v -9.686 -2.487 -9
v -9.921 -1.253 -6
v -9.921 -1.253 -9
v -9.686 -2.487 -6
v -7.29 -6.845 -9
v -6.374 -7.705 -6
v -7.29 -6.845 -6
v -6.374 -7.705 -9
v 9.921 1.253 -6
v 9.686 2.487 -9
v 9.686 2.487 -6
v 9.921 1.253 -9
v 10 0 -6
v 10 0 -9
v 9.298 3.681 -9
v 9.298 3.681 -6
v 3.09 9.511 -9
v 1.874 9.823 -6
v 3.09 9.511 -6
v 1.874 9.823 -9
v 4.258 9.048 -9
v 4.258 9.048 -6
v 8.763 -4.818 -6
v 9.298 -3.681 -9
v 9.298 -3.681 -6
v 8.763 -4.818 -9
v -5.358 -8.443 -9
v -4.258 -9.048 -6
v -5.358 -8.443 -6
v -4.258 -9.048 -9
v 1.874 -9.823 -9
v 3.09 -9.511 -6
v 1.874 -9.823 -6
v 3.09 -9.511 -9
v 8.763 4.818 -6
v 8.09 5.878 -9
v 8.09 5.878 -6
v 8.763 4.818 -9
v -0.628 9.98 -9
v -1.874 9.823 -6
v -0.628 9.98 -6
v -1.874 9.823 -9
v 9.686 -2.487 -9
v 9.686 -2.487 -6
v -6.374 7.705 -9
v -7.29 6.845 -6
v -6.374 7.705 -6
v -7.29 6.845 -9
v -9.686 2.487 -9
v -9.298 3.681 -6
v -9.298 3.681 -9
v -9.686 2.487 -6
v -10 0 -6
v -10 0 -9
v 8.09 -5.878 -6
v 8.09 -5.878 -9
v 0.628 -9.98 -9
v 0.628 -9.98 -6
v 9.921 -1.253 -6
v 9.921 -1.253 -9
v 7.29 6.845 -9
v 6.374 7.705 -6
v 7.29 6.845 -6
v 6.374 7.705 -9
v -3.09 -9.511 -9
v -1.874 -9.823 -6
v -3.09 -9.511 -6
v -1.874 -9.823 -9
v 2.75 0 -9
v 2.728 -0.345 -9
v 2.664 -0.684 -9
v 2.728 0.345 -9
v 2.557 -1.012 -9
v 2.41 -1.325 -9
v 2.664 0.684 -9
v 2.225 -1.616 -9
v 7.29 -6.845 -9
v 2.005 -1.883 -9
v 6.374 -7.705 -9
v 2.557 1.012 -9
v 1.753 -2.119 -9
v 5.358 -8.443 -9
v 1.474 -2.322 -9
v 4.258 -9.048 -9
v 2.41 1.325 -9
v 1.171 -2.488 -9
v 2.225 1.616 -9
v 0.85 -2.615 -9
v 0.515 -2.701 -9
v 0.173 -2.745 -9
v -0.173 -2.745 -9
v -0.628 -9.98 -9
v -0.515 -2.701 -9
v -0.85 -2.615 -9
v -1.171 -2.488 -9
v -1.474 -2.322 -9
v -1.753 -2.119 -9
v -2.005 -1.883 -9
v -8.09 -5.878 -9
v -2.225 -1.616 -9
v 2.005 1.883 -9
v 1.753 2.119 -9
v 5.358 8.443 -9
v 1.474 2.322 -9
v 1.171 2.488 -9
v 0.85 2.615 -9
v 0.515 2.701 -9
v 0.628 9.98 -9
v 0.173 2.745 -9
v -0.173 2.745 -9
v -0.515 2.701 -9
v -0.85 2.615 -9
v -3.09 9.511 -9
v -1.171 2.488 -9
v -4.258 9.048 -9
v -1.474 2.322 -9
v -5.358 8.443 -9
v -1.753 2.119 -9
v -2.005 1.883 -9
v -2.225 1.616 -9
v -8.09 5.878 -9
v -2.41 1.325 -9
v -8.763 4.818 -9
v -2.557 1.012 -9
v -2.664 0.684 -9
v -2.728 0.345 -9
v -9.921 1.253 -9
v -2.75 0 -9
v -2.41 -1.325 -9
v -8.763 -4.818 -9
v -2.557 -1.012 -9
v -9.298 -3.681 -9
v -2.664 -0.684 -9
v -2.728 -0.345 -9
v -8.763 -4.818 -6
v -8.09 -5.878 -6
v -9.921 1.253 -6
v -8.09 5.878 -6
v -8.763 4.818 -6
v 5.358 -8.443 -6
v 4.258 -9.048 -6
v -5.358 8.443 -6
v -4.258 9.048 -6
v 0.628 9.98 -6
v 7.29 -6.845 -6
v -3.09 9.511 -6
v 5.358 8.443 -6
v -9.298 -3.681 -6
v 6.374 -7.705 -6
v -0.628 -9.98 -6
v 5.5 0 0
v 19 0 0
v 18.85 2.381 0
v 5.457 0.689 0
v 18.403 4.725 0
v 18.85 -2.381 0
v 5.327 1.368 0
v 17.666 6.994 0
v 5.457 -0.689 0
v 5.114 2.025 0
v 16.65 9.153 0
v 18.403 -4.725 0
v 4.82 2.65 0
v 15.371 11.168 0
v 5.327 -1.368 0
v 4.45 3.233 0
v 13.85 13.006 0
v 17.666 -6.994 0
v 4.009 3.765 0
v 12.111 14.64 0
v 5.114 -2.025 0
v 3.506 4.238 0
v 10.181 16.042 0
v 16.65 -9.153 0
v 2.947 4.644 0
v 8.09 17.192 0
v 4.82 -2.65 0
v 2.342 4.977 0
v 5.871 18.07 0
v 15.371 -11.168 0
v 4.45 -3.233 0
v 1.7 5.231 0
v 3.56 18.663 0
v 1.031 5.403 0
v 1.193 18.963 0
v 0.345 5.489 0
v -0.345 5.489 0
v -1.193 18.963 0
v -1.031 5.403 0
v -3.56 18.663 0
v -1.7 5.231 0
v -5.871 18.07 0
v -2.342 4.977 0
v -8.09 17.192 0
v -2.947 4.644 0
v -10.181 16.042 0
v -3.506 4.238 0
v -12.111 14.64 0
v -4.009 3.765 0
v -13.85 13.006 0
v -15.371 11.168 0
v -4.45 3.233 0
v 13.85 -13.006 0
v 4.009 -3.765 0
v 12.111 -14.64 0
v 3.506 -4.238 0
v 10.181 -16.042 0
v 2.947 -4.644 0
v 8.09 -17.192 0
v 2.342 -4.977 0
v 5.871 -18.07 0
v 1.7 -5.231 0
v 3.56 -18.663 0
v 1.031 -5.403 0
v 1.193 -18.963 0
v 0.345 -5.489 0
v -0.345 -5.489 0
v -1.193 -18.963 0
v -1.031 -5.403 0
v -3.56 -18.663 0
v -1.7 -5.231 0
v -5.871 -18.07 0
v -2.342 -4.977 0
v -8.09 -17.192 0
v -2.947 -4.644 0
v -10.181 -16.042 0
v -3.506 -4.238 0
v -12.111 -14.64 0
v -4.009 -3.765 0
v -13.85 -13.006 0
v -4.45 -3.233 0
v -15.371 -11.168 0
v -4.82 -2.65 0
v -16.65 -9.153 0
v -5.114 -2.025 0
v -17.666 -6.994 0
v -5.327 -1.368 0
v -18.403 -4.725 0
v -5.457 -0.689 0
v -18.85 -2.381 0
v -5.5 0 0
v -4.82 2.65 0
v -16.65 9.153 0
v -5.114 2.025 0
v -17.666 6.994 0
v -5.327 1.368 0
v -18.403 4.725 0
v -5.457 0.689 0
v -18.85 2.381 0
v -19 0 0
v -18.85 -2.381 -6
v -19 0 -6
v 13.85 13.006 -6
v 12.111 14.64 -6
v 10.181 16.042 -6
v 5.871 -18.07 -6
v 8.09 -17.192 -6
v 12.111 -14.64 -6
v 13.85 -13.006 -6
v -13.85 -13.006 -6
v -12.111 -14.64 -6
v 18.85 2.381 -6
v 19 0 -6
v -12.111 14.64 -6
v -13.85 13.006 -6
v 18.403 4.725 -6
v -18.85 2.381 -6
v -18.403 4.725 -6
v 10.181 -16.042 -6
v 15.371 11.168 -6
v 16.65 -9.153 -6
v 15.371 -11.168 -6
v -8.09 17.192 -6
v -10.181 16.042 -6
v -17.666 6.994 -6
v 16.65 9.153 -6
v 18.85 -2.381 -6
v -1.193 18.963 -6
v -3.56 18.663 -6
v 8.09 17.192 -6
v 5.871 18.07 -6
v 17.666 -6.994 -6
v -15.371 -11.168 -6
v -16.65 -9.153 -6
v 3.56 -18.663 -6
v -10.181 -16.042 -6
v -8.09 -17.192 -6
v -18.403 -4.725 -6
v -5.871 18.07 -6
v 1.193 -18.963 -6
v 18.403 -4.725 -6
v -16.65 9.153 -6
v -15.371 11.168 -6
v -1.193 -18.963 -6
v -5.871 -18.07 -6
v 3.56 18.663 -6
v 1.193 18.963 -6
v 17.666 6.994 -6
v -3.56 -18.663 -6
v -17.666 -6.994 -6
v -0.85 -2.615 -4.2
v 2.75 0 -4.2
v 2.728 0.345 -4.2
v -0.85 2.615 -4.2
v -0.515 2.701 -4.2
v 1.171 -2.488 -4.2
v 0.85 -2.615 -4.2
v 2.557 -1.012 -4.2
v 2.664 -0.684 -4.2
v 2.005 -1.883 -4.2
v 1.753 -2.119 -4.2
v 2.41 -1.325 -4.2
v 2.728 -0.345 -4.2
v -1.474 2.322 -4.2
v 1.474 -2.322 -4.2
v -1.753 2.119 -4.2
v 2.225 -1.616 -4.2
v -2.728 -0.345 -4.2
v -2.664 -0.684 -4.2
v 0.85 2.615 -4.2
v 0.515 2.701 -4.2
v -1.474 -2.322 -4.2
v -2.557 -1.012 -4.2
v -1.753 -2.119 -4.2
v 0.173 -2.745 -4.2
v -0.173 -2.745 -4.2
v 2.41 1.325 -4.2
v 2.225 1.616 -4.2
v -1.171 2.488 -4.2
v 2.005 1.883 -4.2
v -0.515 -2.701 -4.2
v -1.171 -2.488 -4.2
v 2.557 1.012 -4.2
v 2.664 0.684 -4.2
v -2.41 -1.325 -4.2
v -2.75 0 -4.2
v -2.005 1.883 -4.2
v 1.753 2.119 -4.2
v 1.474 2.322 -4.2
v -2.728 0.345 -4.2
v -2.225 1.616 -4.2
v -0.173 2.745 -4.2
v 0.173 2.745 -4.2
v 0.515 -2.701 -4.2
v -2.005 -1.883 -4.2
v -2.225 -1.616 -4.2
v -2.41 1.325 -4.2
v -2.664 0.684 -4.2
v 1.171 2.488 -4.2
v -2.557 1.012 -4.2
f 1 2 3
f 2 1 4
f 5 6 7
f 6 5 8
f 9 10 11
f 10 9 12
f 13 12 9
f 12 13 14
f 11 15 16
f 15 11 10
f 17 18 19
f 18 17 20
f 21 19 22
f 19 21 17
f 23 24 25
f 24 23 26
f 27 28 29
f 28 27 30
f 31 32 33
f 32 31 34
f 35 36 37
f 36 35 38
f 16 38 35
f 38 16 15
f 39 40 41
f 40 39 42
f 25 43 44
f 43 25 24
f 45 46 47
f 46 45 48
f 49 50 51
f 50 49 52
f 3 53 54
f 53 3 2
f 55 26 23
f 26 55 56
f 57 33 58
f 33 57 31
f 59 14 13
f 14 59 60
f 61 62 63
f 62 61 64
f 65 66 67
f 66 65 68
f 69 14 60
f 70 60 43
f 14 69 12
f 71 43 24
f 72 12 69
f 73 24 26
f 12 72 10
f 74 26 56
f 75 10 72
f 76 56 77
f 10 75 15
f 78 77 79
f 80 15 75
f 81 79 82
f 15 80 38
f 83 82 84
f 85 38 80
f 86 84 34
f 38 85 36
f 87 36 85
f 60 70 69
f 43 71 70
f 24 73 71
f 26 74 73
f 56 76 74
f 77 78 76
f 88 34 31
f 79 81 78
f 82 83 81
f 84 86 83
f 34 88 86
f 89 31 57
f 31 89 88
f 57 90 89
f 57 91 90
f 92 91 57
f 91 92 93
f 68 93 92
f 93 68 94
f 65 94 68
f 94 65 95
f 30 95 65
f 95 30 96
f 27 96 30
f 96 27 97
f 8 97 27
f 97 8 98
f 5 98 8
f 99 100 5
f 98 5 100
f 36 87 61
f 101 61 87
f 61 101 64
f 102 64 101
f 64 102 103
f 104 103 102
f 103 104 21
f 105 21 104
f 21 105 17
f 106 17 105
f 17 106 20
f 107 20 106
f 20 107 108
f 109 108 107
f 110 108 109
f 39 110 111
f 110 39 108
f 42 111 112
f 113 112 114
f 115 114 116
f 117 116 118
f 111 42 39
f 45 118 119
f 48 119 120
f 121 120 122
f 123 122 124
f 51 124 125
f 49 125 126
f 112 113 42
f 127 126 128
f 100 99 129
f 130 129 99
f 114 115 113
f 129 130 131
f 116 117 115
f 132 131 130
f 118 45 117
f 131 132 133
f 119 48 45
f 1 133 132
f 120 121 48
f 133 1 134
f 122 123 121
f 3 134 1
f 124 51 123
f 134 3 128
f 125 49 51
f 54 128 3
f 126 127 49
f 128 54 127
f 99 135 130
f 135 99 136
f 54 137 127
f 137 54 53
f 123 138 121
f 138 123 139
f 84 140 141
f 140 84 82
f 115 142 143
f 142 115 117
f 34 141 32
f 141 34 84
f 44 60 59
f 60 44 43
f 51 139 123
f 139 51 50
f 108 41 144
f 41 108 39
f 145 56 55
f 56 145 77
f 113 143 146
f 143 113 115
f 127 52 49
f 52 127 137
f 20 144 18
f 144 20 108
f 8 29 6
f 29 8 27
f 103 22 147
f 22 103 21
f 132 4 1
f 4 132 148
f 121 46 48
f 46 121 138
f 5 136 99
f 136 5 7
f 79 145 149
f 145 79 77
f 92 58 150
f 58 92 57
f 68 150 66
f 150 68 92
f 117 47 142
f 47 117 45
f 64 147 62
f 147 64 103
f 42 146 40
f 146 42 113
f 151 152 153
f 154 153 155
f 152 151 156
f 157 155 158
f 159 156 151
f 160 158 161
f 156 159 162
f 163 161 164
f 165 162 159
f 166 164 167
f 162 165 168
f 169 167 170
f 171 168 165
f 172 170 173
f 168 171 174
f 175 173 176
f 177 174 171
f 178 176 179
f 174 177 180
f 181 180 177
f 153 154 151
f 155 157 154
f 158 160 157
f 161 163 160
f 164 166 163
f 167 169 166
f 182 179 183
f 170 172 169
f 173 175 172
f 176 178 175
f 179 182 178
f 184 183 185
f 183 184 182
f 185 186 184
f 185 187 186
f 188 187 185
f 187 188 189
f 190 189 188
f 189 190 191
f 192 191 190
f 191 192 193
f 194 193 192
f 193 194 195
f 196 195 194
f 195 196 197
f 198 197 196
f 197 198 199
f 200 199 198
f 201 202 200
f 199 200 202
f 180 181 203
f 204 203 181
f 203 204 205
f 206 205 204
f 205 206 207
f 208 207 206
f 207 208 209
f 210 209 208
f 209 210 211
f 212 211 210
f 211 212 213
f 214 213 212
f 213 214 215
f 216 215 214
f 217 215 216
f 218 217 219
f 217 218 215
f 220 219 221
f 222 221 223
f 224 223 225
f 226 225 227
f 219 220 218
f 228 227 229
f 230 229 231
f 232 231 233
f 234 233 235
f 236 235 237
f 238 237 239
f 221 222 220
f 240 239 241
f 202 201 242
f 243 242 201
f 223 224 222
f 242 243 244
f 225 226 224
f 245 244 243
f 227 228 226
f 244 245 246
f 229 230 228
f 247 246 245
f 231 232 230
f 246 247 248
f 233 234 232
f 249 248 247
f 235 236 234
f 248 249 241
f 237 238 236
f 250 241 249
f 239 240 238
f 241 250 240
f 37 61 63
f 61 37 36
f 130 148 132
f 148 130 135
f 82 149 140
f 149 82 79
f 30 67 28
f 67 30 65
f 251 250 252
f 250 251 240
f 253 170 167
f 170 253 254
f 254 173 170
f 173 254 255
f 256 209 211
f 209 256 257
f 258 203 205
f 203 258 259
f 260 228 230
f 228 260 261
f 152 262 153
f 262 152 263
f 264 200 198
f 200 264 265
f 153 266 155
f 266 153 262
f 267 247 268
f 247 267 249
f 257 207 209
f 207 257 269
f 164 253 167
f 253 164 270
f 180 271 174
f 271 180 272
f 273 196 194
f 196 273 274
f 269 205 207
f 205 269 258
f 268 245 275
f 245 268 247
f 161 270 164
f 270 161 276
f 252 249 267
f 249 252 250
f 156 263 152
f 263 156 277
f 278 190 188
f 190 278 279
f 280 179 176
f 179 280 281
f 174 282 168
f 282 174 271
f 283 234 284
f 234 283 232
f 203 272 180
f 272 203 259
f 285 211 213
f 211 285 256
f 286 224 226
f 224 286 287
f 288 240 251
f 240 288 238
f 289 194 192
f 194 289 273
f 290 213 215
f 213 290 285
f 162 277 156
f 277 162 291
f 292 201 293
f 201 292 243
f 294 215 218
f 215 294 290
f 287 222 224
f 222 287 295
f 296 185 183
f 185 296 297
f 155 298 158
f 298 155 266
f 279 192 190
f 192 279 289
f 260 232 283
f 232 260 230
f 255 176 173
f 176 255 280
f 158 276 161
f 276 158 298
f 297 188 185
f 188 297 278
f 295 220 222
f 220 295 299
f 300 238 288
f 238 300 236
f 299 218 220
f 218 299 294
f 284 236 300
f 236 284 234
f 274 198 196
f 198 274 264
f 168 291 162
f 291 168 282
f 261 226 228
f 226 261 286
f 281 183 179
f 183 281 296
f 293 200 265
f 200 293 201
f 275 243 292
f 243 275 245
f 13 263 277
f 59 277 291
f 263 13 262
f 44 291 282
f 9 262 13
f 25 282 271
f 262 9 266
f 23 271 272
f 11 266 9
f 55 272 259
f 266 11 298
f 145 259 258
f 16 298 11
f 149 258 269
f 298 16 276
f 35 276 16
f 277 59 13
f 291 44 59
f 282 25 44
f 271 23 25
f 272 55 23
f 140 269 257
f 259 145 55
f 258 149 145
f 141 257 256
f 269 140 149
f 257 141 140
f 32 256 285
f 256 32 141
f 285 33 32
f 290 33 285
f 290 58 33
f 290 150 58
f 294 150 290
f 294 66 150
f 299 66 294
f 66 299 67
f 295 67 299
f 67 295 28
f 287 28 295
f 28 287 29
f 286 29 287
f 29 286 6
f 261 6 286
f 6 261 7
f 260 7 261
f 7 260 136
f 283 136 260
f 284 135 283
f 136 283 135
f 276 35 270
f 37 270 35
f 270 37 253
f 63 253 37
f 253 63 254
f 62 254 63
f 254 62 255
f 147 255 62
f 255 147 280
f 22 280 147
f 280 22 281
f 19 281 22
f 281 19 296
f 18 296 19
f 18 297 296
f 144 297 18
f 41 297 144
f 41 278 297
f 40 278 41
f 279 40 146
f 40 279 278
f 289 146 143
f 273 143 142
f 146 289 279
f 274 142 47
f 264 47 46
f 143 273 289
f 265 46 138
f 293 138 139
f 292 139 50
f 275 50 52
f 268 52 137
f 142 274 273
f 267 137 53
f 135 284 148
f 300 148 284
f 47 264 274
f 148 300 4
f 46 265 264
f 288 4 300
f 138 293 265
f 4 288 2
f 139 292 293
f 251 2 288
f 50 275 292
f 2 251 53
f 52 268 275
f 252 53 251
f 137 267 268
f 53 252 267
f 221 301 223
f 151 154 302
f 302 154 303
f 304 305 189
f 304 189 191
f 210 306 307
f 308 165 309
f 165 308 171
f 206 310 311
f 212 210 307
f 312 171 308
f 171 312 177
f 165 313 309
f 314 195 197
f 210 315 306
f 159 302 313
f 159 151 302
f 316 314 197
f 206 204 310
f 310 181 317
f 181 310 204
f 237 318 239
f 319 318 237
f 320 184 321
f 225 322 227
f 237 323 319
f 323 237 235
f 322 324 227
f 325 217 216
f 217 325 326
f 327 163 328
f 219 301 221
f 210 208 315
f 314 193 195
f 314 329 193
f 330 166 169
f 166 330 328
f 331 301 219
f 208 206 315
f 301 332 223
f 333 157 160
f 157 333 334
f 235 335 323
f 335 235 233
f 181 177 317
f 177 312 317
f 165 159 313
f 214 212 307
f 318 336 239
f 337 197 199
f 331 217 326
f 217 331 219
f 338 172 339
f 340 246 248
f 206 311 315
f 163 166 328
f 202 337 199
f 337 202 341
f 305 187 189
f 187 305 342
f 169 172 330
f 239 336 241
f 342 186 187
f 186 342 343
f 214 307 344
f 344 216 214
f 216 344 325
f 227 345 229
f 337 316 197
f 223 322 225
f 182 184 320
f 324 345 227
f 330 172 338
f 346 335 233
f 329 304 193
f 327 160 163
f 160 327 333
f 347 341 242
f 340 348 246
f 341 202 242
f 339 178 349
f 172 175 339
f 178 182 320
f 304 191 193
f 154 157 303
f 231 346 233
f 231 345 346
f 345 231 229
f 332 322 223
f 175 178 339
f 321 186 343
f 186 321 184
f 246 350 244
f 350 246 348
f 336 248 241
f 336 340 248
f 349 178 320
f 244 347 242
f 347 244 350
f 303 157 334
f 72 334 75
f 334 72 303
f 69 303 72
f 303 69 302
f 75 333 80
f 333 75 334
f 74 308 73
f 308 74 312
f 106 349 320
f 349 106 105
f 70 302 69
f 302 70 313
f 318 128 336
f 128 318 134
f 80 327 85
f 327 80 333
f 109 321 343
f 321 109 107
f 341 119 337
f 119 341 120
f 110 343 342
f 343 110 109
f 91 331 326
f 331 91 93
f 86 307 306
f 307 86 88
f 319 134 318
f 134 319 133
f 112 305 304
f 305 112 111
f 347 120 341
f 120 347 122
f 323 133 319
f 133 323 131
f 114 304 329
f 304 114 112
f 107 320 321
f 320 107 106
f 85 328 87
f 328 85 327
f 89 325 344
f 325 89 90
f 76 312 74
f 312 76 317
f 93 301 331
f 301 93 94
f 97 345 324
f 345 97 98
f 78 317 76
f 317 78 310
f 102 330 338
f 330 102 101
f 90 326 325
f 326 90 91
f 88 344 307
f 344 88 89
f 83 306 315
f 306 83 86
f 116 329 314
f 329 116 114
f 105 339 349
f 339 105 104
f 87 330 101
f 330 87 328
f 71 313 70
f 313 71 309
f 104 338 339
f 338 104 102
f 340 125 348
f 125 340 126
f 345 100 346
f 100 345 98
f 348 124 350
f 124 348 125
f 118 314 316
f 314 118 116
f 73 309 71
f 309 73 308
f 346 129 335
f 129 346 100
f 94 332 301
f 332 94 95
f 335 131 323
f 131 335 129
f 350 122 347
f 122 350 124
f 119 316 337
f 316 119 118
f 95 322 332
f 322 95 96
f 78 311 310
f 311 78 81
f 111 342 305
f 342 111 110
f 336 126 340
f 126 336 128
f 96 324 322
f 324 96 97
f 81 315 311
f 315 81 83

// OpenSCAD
$fn = 50;


difference() {
	union() {
		translate(v = [0, 0, -9.0000000000]) {
			cylinder(h = 9, r = 10.0000000000);
		}
		translate(v = [0, 0, -6.0000000000]) {
			cylinder(h = 6, r = 19.0000000000);
		}
	}
	union() {
		translate(v = [0, 0, 0]) {
			rotate(a = [0, 0, 0]) {
				difference() {
					union() {
						#translate(v = [0, 0, -9.0000000000]) {
							cylinder(h = 9, r = 2.2500000000);
						}
						#translate(v = [0, 0, -4.2000000000]) {
							cylinder(h = 4.2000000000, r1 = 2.7500000000, r2 = 5.5000000000);
						}
						#translate(v = [0, 0, -9.0000000000]) {
							cylinder(h = 9, r = 2.7500000000);
						}
						#translate(v = [0, 0, -9.0000000000]) {
							cylinder(h = 9, r = 2.2500000000);
						}
					}
					union();
				}
			}
		}
	}
}
